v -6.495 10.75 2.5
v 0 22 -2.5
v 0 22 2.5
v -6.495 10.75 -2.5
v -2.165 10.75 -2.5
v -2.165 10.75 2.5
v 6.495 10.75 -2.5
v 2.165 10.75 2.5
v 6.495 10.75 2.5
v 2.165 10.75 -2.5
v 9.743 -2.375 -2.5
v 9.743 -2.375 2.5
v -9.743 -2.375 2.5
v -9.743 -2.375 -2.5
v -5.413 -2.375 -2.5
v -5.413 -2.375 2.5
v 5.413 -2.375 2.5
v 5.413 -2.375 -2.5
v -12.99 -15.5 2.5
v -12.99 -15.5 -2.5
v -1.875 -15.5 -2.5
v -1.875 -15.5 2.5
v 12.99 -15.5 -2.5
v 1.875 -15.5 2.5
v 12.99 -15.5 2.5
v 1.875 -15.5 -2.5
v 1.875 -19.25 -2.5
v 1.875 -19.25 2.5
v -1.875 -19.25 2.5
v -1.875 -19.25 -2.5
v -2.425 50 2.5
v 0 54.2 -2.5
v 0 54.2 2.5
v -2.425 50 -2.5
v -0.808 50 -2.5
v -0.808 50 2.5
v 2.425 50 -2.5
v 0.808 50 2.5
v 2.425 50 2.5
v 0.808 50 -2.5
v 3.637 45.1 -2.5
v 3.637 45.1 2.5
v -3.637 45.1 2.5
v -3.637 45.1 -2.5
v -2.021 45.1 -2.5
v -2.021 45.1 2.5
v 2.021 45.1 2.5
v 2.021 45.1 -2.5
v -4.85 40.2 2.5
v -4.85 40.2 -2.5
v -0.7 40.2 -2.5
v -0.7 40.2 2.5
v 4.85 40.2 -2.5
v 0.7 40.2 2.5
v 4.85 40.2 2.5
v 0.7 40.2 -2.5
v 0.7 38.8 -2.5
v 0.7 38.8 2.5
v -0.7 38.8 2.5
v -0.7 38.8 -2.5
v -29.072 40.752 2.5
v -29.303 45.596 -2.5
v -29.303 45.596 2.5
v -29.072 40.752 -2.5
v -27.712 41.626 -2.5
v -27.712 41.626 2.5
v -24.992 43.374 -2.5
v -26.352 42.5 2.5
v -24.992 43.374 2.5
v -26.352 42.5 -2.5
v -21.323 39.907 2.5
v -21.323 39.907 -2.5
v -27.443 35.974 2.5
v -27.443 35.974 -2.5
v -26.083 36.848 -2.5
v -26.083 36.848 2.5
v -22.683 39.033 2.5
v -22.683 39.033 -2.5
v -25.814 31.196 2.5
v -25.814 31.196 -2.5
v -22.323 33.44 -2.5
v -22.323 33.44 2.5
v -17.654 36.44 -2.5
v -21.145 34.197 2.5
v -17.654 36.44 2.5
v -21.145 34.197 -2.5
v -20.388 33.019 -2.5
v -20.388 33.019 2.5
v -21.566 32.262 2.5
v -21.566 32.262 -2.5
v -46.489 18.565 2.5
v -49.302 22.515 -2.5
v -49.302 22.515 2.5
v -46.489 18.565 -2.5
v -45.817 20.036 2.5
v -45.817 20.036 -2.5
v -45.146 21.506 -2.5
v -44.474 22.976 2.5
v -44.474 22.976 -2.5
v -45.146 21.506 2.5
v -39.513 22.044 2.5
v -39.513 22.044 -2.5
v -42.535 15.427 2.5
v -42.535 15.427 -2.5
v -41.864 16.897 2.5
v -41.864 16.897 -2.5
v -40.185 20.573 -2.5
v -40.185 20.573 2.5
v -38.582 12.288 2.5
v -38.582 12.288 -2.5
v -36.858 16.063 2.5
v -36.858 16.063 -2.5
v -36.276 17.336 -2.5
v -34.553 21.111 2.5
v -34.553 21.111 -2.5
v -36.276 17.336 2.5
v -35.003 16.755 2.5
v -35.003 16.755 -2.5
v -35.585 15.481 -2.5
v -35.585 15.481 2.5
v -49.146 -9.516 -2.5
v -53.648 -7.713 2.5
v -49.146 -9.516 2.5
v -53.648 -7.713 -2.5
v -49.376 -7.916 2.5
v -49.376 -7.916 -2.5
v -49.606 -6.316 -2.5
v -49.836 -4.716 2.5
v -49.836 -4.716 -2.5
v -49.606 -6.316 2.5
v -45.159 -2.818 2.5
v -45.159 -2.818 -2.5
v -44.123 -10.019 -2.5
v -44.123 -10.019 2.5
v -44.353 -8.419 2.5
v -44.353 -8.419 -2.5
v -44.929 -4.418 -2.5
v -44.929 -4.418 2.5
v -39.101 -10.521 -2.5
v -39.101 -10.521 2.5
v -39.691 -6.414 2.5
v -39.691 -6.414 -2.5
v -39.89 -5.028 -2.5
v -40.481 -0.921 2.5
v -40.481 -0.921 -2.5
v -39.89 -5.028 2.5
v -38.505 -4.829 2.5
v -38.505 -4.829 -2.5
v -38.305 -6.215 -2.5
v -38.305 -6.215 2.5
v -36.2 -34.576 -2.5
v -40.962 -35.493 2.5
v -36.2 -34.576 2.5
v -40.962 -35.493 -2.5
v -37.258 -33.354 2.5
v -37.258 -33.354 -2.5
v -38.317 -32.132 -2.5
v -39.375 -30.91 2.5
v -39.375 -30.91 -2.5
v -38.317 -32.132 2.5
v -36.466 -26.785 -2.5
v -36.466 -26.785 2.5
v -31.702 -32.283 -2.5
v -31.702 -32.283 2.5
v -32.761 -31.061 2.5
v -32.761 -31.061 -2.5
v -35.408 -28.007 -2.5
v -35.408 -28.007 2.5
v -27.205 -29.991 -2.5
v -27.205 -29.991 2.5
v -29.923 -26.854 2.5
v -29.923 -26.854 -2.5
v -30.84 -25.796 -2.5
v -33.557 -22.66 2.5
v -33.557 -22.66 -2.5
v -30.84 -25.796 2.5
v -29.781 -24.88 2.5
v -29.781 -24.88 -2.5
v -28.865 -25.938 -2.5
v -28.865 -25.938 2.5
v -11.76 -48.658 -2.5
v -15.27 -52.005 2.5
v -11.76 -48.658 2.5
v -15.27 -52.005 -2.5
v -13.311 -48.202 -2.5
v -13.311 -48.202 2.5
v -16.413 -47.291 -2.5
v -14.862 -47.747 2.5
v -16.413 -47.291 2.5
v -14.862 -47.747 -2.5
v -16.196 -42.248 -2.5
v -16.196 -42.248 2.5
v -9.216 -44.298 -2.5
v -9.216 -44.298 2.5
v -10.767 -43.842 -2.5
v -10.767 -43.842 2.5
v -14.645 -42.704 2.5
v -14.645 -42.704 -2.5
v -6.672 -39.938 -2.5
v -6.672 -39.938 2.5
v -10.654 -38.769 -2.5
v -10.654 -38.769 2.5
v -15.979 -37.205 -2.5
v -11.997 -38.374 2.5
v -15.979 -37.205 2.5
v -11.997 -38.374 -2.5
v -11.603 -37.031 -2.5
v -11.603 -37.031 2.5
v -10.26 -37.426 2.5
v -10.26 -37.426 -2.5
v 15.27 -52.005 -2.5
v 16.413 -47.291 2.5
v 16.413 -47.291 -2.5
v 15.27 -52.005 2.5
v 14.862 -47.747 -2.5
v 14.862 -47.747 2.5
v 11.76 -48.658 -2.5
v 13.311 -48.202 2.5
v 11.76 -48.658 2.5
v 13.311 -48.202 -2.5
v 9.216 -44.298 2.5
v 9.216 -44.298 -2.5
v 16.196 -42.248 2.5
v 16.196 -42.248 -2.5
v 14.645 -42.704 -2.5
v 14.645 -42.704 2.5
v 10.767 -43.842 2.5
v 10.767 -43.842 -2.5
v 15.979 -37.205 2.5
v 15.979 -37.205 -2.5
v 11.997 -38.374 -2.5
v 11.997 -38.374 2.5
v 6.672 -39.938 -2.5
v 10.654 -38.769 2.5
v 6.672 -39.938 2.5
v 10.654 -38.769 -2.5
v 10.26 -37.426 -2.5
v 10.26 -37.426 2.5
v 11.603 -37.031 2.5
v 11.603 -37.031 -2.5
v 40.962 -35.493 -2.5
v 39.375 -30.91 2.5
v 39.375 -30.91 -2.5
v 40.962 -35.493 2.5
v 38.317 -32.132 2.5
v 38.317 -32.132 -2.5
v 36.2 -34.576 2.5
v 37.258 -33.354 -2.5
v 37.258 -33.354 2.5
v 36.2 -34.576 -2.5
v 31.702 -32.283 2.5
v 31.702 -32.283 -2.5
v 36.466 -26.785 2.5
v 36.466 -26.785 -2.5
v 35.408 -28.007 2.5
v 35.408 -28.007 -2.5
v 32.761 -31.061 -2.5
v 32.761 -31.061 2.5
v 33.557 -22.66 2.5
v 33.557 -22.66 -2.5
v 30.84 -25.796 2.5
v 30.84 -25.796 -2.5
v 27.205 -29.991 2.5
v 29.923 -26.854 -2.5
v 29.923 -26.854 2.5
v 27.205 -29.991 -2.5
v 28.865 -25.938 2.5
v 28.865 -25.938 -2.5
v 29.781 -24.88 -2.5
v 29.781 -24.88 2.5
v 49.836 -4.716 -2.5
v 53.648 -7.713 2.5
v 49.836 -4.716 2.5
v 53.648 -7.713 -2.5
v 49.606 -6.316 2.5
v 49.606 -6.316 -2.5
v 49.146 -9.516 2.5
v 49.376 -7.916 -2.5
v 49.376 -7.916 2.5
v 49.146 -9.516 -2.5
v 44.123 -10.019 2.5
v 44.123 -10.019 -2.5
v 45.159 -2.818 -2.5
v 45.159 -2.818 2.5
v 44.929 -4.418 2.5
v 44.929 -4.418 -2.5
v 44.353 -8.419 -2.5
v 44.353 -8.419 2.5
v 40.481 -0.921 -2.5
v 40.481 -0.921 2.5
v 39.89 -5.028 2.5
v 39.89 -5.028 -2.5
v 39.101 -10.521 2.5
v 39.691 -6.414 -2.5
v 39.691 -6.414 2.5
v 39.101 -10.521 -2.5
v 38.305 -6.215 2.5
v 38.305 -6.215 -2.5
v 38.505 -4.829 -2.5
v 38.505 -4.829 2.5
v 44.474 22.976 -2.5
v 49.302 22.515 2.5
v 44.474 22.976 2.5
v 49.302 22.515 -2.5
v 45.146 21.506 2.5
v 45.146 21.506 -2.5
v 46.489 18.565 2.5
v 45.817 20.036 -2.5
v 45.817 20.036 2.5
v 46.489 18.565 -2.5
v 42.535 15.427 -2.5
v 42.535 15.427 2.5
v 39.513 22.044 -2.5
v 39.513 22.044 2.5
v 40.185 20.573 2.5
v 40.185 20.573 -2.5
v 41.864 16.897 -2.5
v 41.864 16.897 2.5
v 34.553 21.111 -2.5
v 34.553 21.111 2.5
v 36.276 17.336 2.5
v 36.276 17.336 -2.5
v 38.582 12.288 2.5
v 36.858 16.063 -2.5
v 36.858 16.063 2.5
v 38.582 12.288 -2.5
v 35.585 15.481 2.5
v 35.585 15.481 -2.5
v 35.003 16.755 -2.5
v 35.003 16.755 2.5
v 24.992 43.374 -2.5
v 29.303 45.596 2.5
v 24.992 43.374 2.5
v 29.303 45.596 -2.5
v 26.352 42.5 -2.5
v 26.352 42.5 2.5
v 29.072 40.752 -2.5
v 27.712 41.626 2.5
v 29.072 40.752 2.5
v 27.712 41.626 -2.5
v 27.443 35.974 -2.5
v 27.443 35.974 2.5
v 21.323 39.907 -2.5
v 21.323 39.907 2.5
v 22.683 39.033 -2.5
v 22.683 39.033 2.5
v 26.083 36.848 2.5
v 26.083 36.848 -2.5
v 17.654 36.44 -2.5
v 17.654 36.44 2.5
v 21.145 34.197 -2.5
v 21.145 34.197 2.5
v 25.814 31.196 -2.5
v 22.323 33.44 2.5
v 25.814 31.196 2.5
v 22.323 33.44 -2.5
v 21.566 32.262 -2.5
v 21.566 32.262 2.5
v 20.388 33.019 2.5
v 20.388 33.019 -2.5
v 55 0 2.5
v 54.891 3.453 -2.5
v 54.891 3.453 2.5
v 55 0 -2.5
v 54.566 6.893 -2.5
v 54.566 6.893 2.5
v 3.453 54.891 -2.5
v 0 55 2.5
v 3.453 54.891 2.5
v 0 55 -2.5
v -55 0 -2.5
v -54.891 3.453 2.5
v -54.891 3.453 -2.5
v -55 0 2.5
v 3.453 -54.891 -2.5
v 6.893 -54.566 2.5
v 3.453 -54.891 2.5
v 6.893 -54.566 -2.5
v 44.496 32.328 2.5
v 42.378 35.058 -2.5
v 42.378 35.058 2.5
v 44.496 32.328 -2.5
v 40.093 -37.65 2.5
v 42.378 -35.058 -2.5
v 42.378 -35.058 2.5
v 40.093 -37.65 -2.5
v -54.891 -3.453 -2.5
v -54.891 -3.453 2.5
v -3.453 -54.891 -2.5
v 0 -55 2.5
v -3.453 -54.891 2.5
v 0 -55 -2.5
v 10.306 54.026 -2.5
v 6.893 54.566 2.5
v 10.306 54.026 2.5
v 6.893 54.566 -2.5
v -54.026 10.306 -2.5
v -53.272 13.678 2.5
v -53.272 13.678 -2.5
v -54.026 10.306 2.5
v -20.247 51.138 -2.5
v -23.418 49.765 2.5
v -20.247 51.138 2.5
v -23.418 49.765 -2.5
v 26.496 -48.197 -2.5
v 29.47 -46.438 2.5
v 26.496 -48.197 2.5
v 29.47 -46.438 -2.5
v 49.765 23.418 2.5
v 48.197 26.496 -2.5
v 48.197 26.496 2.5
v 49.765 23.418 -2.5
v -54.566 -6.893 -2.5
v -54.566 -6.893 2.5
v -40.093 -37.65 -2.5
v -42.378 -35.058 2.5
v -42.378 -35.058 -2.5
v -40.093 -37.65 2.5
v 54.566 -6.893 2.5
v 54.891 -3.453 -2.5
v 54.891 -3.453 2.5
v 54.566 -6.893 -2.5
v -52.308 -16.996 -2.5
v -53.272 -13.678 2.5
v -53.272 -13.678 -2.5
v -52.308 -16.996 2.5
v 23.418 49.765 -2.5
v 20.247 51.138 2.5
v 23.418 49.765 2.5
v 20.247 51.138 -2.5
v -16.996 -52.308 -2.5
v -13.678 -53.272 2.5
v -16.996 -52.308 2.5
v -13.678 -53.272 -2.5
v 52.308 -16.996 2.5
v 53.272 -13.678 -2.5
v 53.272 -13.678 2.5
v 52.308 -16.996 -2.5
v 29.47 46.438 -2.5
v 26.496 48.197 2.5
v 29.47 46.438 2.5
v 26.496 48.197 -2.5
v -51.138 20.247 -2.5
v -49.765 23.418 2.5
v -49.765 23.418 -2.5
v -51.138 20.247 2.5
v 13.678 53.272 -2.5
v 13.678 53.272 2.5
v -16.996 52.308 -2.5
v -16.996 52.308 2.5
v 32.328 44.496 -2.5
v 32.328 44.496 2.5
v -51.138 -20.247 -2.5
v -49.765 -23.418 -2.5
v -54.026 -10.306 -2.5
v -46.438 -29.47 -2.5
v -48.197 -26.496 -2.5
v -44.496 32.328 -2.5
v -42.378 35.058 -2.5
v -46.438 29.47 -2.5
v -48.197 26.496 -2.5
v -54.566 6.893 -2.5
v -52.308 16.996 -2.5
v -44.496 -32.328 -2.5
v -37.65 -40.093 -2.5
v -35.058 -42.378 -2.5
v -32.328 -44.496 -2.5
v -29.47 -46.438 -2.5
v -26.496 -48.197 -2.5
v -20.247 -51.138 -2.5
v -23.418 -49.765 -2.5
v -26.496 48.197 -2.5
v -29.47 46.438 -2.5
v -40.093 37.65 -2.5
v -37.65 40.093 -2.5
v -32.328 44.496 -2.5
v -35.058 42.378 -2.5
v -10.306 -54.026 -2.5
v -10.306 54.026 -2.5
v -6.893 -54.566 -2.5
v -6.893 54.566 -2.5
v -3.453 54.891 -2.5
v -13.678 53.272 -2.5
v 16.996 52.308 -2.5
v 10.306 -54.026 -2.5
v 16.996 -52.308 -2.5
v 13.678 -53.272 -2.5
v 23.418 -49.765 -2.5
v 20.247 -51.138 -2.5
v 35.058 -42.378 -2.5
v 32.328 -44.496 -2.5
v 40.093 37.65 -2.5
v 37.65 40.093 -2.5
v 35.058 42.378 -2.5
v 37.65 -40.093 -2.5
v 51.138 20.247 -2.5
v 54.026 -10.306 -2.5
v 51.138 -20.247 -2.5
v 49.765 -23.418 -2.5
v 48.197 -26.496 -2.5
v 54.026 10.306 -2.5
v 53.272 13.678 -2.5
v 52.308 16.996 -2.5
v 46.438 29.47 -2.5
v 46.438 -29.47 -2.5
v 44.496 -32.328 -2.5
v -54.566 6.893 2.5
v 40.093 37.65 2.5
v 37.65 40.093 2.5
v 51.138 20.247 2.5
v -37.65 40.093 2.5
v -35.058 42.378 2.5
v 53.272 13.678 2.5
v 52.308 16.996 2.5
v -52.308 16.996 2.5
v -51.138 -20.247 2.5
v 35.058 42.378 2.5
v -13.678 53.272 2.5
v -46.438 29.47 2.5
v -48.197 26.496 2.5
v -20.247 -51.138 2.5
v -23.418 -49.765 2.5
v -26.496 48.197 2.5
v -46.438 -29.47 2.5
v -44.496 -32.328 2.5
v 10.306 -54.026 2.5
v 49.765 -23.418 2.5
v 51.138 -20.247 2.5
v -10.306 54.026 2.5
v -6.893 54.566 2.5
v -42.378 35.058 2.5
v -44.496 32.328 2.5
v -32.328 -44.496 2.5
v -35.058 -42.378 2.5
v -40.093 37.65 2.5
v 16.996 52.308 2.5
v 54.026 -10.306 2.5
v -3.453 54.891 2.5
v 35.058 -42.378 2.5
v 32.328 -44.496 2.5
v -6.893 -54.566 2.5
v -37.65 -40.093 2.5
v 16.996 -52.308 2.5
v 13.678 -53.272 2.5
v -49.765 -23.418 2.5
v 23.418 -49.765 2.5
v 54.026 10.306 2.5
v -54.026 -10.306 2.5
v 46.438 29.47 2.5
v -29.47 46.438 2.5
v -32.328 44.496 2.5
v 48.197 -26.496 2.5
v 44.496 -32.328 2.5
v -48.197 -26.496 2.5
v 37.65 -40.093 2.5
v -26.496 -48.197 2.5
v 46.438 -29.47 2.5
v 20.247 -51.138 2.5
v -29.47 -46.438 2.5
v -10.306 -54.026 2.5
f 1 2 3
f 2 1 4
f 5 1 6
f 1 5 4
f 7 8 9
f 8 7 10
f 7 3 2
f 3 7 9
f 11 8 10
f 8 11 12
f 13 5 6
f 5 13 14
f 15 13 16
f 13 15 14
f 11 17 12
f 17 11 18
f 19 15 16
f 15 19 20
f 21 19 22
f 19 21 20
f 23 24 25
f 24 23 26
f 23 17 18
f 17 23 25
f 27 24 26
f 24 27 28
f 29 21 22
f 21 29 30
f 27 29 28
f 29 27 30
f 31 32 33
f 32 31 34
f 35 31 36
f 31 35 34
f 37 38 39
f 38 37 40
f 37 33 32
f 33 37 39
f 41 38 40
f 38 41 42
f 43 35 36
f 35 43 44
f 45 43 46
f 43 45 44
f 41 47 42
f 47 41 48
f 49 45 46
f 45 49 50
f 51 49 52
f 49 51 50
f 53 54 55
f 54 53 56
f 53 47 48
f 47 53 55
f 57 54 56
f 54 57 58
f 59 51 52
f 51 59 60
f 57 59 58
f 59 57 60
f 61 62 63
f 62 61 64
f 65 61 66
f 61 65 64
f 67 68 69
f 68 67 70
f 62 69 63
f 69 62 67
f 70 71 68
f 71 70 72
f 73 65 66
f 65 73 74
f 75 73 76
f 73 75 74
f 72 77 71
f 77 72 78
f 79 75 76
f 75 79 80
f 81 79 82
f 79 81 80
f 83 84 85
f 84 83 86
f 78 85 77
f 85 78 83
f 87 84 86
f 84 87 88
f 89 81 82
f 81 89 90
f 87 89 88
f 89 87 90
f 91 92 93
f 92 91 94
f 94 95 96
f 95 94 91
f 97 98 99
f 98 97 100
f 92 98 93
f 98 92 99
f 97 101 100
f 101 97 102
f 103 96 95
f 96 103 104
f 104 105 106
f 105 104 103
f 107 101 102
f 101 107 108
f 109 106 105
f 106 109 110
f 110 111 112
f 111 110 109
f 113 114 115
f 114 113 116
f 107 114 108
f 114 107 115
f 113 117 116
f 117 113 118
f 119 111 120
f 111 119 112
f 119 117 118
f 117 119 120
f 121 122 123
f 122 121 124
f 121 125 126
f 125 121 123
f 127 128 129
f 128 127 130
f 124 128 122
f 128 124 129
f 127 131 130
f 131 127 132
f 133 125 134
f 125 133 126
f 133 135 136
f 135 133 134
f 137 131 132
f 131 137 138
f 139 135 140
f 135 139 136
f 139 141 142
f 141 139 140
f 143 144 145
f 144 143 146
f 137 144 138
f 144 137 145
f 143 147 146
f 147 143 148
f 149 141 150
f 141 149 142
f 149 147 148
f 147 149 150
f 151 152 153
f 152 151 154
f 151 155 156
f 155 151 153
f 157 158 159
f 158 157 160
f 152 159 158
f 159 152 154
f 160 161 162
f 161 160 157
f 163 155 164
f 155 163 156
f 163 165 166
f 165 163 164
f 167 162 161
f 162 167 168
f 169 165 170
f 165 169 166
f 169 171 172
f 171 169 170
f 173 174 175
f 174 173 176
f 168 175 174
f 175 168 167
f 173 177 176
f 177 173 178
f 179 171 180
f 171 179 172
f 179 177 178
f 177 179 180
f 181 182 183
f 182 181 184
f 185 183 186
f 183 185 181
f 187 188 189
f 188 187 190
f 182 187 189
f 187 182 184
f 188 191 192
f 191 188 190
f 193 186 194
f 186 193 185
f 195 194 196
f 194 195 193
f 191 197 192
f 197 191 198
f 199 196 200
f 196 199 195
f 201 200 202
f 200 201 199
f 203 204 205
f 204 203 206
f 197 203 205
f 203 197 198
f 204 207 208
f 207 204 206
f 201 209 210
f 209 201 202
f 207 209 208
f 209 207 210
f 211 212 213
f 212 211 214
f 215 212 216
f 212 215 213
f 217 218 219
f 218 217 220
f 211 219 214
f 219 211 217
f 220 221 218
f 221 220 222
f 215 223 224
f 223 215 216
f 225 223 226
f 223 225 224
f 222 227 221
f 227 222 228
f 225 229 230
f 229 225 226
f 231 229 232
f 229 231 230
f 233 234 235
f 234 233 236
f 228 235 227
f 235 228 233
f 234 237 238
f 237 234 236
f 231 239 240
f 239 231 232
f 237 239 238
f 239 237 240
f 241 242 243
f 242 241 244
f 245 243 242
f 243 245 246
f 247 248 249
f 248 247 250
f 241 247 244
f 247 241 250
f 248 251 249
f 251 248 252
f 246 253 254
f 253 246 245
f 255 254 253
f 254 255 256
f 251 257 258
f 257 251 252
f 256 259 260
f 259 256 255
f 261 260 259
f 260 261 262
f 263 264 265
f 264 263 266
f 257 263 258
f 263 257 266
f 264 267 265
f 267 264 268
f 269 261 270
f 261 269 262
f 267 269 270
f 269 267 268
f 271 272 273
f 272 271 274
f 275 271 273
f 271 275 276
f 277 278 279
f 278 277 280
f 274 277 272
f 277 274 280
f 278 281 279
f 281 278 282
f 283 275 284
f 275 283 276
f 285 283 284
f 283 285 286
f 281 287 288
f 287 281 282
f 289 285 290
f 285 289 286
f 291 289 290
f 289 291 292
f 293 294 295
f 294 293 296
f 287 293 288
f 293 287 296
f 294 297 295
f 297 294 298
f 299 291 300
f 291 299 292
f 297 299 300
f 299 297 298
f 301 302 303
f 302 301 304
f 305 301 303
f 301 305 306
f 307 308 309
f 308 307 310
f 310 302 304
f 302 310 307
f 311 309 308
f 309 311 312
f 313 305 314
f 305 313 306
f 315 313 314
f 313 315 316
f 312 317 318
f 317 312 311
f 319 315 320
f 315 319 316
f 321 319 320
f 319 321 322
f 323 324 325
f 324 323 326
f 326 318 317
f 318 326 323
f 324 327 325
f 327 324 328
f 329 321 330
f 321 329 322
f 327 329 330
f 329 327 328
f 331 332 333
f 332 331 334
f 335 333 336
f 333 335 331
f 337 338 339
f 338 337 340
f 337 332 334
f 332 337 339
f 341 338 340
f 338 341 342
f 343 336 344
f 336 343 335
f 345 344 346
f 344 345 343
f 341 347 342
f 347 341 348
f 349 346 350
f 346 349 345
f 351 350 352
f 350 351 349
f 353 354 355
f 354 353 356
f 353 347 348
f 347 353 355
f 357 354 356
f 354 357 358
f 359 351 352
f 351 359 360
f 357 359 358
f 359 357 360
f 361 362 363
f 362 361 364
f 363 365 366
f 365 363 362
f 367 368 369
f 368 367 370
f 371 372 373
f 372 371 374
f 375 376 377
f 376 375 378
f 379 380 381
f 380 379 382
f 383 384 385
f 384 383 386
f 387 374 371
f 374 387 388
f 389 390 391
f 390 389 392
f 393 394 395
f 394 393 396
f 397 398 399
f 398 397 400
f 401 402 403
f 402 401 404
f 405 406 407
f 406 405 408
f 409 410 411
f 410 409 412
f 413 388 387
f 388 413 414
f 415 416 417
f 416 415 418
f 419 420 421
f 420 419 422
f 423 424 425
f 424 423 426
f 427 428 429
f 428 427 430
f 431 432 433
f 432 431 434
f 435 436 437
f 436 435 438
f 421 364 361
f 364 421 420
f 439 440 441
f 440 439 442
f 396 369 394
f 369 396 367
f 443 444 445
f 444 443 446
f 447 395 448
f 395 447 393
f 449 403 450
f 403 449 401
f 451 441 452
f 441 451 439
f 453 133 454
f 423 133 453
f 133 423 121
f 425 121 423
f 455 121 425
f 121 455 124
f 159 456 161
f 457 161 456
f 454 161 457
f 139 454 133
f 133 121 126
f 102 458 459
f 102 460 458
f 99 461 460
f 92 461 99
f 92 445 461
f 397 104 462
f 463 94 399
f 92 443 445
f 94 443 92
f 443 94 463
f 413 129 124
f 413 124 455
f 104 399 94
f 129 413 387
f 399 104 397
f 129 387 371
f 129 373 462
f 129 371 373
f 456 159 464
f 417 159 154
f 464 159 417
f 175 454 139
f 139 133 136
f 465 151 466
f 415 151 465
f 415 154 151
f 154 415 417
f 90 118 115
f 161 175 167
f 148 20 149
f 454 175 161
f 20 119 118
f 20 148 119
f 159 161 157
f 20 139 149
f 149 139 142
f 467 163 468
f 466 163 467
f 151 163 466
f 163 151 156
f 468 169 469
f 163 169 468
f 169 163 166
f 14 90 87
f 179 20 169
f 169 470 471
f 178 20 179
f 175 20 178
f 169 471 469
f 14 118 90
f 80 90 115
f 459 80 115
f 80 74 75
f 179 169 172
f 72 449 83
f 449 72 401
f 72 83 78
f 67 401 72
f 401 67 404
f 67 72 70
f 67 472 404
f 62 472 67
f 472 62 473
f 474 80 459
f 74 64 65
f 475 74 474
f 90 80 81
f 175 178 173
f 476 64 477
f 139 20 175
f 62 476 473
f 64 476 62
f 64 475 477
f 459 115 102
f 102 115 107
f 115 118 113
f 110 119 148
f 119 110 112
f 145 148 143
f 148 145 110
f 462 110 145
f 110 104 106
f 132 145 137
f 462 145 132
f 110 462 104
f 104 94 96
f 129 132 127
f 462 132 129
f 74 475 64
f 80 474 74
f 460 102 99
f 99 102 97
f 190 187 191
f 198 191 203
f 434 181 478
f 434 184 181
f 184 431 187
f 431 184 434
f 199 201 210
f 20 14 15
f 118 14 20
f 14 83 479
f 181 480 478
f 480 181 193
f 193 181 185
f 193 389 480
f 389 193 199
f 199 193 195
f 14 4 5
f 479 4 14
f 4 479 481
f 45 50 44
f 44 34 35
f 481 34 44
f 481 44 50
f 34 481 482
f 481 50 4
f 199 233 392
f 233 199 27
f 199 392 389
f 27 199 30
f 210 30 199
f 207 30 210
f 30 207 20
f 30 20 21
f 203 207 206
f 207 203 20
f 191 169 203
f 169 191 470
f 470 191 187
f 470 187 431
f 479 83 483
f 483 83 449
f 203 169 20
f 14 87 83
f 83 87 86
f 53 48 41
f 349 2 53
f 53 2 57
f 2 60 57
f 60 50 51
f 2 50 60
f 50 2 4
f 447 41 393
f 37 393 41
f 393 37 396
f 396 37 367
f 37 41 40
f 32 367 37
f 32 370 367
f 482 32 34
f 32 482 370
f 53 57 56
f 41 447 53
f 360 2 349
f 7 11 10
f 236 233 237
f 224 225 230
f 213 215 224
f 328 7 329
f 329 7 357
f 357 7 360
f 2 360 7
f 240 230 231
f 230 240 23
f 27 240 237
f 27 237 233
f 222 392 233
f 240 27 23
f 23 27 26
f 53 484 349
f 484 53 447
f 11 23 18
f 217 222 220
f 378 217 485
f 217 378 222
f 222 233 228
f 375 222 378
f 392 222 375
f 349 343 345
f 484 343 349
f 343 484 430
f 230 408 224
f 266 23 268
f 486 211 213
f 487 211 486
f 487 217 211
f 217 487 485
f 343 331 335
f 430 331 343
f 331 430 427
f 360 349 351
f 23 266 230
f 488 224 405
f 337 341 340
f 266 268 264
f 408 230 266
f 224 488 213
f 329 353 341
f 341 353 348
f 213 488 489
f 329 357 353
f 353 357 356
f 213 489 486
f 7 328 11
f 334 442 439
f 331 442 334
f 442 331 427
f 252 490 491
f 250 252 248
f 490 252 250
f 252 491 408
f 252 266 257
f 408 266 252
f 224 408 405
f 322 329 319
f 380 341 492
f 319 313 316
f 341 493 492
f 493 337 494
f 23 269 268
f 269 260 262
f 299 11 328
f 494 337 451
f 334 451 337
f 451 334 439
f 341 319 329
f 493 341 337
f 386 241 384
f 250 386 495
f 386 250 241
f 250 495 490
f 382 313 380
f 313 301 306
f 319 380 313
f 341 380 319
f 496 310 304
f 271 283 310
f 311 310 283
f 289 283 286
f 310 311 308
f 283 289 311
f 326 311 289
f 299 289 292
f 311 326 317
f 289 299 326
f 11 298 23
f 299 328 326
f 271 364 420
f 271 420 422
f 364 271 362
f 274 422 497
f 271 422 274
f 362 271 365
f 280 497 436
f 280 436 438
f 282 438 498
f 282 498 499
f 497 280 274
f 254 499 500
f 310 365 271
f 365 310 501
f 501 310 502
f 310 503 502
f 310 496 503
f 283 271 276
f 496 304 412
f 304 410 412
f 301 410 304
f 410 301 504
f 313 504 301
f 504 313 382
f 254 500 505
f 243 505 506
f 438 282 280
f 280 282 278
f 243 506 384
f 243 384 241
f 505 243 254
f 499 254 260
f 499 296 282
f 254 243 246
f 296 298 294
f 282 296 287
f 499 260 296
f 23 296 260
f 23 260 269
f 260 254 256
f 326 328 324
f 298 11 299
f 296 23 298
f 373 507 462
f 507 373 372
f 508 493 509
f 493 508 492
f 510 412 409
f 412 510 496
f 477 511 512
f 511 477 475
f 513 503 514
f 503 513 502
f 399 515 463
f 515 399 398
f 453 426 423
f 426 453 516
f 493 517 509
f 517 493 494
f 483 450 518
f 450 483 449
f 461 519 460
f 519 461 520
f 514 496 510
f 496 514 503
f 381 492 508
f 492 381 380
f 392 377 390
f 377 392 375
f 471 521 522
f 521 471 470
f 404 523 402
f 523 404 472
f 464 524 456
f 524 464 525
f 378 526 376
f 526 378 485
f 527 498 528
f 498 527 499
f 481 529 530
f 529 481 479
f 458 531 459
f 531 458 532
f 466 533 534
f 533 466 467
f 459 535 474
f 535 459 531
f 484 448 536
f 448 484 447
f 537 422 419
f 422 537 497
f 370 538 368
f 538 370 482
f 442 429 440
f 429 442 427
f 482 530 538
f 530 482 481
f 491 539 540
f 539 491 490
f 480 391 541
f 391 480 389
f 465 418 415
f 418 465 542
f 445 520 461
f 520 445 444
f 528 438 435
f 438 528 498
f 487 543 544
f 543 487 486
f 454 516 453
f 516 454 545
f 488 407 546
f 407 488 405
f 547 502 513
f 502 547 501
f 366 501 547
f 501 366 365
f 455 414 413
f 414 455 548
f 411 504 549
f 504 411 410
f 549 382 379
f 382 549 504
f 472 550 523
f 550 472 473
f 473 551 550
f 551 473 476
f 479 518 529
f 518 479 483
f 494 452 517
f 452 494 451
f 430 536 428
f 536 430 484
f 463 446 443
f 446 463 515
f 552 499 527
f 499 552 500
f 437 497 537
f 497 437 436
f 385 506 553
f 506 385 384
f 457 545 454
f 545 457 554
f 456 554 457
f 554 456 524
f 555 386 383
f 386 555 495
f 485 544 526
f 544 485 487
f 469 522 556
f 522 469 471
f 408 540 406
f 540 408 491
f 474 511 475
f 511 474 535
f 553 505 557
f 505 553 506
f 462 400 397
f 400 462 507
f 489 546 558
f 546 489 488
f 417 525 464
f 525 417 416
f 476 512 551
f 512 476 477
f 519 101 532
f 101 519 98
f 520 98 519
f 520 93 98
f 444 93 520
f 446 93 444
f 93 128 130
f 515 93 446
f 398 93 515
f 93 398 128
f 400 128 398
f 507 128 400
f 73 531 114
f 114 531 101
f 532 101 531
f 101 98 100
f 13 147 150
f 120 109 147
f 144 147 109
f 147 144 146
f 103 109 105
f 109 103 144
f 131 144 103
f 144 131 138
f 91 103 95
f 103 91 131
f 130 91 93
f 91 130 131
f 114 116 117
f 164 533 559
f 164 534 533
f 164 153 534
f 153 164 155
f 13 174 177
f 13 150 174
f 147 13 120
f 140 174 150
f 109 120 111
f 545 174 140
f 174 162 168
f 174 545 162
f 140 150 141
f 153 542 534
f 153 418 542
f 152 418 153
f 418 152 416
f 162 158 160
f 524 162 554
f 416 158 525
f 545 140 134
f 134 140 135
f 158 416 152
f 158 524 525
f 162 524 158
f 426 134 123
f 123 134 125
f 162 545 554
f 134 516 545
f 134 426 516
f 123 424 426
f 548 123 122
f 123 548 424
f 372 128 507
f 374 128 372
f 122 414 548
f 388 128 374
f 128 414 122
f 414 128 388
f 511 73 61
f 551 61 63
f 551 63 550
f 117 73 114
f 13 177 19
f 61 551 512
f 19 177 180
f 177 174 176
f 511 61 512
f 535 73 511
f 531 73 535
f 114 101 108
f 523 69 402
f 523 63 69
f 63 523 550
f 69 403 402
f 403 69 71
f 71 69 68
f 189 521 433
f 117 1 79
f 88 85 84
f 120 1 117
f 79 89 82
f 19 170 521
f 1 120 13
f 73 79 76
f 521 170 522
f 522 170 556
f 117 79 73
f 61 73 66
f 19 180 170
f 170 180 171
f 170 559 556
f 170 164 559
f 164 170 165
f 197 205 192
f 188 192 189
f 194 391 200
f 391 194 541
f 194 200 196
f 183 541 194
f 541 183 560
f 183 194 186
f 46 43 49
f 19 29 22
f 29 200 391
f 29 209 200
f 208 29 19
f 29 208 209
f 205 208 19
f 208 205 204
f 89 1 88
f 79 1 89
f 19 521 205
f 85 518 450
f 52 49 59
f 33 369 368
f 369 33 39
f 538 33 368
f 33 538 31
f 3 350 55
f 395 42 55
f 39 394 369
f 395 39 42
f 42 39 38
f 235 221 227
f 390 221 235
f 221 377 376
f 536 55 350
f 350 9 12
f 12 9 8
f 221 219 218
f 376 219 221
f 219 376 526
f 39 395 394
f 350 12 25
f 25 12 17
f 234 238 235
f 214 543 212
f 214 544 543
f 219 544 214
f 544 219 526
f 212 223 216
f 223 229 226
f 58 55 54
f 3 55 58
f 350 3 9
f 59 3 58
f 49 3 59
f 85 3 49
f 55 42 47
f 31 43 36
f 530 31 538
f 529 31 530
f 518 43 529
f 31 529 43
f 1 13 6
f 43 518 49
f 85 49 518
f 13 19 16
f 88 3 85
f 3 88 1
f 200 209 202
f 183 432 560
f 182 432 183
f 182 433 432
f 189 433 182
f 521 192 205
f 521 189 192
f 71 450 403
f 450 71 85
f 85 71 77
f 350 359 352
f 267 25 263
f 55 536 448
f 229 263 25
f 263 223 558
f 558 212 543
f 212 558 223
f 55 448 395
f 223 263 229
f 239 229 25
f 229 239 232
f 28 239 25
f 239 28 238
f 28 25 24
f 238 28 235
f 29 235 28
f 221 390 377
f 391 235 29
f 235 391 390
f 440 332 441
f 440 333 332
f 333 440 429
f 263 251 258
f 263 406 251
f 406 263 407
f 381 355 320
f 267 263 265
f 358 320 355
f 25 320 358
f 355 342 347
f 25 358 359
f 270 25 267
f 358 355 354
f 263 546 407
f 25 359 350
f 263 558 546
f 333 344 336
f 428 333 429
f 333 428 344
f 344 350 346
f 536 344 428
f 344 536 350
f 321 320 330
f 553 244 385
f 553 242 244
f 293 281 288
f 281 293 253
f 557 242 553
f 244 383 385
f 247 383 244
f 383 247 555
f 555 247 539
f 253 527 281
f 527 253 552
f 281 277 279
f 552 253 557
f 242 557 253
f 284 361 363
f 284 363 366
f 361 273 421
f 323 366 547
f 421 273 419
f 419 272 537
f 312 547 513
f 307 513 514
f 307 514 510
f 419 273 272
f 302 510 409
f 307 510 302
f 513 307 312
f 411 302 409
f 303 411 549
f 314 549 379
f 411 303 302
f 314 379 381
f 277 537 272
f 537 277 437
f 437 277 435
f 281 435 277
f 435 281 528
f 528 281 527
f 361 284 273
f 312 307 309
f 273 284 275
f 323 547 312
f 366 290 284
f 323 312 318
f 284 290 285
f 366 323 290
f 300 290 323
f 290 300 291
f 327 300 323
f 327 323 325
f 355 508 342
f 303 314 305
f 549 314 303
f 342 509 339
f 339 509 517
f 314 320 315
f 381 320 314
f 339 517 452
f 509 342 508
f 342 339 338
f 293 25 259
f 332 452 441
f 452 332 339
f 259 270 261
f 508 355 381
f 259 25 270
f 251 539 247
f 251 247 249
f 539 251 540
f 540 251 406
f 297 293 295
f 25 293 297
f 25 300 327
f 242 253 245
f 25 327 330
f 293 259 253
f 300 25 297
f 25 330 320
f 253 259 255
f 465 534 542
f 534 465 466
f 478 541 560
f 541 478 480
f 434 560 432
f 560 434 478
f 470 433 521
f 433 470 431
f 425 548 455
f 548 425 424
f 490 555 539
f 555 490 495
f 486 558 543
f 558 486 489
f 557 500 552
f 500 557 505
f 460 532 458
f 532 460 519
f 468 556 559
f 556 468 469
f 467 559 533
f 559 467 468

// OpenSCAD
// file: ../../../shapes/religion/christianity/crucifixion-cross/crucifixion-cross.scad
crucifixionCcross();

module crucifixionCcross(height=2)
{
    beamWidth = 3;
    
    union()
    {
        // vertical beam
        xTranslate = -beamWidth / 2.0;
        yLength = 13;
        color("brown")
        translate([xTranslate, 0, 0])
        cube([3, yLength, height]);

        // horizontal beam        
        yTranslate = yLength * 0.5;
        xLength = yLength * 0.75;
        xTranslateHBeam = -xLength / 2.0;
        
        color("green")
        translate([xTranslateHBeam, yTranslate, 0])
        cube([xLength, 3, height]);        
    }        
}
// file: ../../../shapes/trees/christmas/christmas-tree.scad
christmasTree();

module christmasTree(height = 3)
{
    union()
    {
        // top triangle
        translate([0, 30, 0])
        triangle(10, height);
        
        // middle triangle
        translate([0, 15, 0])
        color("green")
        triangle(15, height);
        
        // bottom triangle
        triangle(20, height);
        
        // trunk
        color("brown")
        translate([-2.5, -15, 0])
        cube([5, 5, height]);
    }
}

module triangle(size, height)
{
    rotate([0, 0, 90])
    cylinder(r=size, 
             $fn=3,
             h=height);
}
// file: ../../../shapes/spurs/spurs-a.scad
// Module names are of the form poly_<inkscape-path-id>().  As a result,
// you can associate a polygon in this OpenSCAD program with the corresponding
// SVG element in the Inkscape document by looking for the XML element with
// the attribute id="inkscape-path-id".

// fudge value is used to ensure that subtracted solids are a tad taller
// in the z dimension than the polygon being subtracted from.  This helps
// keep the resulting .stl file manifold.
fudge = 0.1;

module spurs(h)
{
  scale([25.4/90, -25.4/90, 1]) union()
  {
    linear_extrude(height=h)
      polygon([[13.500000,-56.000000],[29.500000,-55.000000],[54.500000,-55.000000],[58.503750,-55.048750],[60.522969,-55.341719],[62.290000,-56.020000],[64.325156,-57.853594],[66.241250,-60.541250],[69.240000,-66.000000],[80.500000,-87.000000],[106.280000,-135.000000],[118.870000,-159.000000],[122.780000,-198.000000],[124.023594,-204.882813],[125.843750,-209.652500],[128.457031,-214.095937],[132.080000,-220.000000],[148.490000,-248.000000],[153.376719,-256.487656],[155.041895,-259.143652],[156.518750,-260.956250],[158.055137,-262.086816],[159.898906,-262.696719],[165.500000,-263.000000],[214.500000,-263.000000],[214.500000,-213.000000],[213.360000,-196.000000],[213.360000,-154.000000],[213.495000,-150.462500],[213.360000,-147.000000],[196.920000,-117.000000],[156.350000,-45.000000],[125.920000,9.000000],[120.671250,18.592500],[117.385469,23.577187],[115.794199,25.366055],[114.320000,26.400000],[112.797344,26.797500],[110.981250,26.970000],[107.500000,27.000000],[79.500000,27.000000],[65.500000,28.000000],[31.500000,28.000000],[27.943750,28.030000],[24.500000,28.600000],[22.684180,29.597539],[20.548438,31.277812],[15.792500,35.922500],[7.670000,45.000000],[-36.500000,94.040000],[-25.500000,94.040000],[-15.500000,95.000000],[1.500000,95.000000],[22.500000,96.000000],[2.500000,114.080000],[-38.500000,149.000000],[-23.230000,165.000000],[-3.230000,188.000000],[14.500000,210.000000],[-66.500000,189.000000],[-91.500000,263.000000],[-92.970664,261.624141],[-94.426562,259.592500],[-97.197500,254.302500],[-101.500000,244.000000],[-121.500000,198.000000],[-200.500000,222.000000],[-174.840000,182.000000],[-154.500000,151.000000],[-187.500000,128.020000],[-214.500000,108.000000],[-166.500000,103.830000],[-135.500000,101.000000],[-137.410000,77.000000],[-139.590000,41.000000],[-140.500000,31.000000],[-138.108496,32.343340],[-135.722969,34.055469],[-131.038750,38.223750],[-122.500000,47.000000],[-111.500000,57.040000],[-94.500000,74.000000],[-77.500000,27.000000],[-107.500000,26.000000],[-117.196250,25.451250],[-122.812656,24.814531],[-126.090000,23.980000],[-127.513906,22.488438],[-128.773750,20.335000],[-130.730000,16.000000],[-138.200000,-1.000000],[-140.195000,-5.868750],[-140.649688,-8.406719],[-140.330000,-11.000000],[-134.780000,-21.000000],[-120.780000,-45.000000],[-74.650000,-124.000000],[-55.110000,-158.000000],[-46.570000,-206.000000],[-30.280000,-238.000000],[-21.920000,-254.000000],[-19.818750,-257.793750],[-18.535156,-259.646094],[-17.110000,-260.980000],[-15.251406,-261.684844],[-12.943750,-261.983750],[-8.500000,-261.990000],[5.500000,-261.000000],[19.500000,-261.000000],[31.500000,-260.040000],[43.500000,-260.040000],[43.500000,-217.000000],[44.500000,-200.000000],[44.500000,-162.000000],[43.800000,-154.000000],[28.100000,-127.000000],[-14.500000,-56.000000],[13.500000,-56.000000]]);
  }
}

spurs(5);
// file: ../../coin.scad
use <../shapes/spurs/spurs-a.scad>
use <../shapes/trees/christmas/christmas-tree.scad>
use <../shapes/religion/christianity/crucifixion-cross/crucifixion-cross.scad>

module coin(innerIcon,
            innerIconXyScale,
            innerIconOffsetY,
            outterIcon,
            outerIconCount,            
            outerIconXyScale,
            radius,
            height)
{
    difference()
    {
        // main disk
        cylinder (h = height, r=radius, center = true, $fn=100);
        
        // inner icon
        translate([0, innerIconOffsetY, -5])
//        translate([0,0,-5])
        scale([innerIconXyScale, innerIconXyScale, 3.0])
//        scale([0.35, 0.35, 3.0])
        coinIcon(innerIcon, height);
        
        // outer icons
        for ( i = [0 : outerIconCount] )
        {
            rotate( i * 360 / (outerIconCount+1), [0, 0, 1])
            translate([0, 43, -5])
            scale([outerIconXyScale, outerIconXyScale, 3.0])
            coinIcon(outterIcon, height);
        }
    }    
}

module coinIcon(iconName, height)
{
    if(iconName == "Cross")
    {
        crucifixionCcross(height);
    }
//    else if(iconName == "Tree")
//    {
//        
//    }
    else
    {
        // defalut
        christmasTree(height);
    }
//  import(centerIcon);    
}
// main file
use <../../coin.scad>;

coin(innerIcon = "Tree",
     innerIconXyScale = 0.75,
     innerIconOffsetY = -8,
     outterIcon = "Tree",
     outerIconCount = 10,            
     outerIconXyScale = 0.28,
     radius = 55,
     height=5);
